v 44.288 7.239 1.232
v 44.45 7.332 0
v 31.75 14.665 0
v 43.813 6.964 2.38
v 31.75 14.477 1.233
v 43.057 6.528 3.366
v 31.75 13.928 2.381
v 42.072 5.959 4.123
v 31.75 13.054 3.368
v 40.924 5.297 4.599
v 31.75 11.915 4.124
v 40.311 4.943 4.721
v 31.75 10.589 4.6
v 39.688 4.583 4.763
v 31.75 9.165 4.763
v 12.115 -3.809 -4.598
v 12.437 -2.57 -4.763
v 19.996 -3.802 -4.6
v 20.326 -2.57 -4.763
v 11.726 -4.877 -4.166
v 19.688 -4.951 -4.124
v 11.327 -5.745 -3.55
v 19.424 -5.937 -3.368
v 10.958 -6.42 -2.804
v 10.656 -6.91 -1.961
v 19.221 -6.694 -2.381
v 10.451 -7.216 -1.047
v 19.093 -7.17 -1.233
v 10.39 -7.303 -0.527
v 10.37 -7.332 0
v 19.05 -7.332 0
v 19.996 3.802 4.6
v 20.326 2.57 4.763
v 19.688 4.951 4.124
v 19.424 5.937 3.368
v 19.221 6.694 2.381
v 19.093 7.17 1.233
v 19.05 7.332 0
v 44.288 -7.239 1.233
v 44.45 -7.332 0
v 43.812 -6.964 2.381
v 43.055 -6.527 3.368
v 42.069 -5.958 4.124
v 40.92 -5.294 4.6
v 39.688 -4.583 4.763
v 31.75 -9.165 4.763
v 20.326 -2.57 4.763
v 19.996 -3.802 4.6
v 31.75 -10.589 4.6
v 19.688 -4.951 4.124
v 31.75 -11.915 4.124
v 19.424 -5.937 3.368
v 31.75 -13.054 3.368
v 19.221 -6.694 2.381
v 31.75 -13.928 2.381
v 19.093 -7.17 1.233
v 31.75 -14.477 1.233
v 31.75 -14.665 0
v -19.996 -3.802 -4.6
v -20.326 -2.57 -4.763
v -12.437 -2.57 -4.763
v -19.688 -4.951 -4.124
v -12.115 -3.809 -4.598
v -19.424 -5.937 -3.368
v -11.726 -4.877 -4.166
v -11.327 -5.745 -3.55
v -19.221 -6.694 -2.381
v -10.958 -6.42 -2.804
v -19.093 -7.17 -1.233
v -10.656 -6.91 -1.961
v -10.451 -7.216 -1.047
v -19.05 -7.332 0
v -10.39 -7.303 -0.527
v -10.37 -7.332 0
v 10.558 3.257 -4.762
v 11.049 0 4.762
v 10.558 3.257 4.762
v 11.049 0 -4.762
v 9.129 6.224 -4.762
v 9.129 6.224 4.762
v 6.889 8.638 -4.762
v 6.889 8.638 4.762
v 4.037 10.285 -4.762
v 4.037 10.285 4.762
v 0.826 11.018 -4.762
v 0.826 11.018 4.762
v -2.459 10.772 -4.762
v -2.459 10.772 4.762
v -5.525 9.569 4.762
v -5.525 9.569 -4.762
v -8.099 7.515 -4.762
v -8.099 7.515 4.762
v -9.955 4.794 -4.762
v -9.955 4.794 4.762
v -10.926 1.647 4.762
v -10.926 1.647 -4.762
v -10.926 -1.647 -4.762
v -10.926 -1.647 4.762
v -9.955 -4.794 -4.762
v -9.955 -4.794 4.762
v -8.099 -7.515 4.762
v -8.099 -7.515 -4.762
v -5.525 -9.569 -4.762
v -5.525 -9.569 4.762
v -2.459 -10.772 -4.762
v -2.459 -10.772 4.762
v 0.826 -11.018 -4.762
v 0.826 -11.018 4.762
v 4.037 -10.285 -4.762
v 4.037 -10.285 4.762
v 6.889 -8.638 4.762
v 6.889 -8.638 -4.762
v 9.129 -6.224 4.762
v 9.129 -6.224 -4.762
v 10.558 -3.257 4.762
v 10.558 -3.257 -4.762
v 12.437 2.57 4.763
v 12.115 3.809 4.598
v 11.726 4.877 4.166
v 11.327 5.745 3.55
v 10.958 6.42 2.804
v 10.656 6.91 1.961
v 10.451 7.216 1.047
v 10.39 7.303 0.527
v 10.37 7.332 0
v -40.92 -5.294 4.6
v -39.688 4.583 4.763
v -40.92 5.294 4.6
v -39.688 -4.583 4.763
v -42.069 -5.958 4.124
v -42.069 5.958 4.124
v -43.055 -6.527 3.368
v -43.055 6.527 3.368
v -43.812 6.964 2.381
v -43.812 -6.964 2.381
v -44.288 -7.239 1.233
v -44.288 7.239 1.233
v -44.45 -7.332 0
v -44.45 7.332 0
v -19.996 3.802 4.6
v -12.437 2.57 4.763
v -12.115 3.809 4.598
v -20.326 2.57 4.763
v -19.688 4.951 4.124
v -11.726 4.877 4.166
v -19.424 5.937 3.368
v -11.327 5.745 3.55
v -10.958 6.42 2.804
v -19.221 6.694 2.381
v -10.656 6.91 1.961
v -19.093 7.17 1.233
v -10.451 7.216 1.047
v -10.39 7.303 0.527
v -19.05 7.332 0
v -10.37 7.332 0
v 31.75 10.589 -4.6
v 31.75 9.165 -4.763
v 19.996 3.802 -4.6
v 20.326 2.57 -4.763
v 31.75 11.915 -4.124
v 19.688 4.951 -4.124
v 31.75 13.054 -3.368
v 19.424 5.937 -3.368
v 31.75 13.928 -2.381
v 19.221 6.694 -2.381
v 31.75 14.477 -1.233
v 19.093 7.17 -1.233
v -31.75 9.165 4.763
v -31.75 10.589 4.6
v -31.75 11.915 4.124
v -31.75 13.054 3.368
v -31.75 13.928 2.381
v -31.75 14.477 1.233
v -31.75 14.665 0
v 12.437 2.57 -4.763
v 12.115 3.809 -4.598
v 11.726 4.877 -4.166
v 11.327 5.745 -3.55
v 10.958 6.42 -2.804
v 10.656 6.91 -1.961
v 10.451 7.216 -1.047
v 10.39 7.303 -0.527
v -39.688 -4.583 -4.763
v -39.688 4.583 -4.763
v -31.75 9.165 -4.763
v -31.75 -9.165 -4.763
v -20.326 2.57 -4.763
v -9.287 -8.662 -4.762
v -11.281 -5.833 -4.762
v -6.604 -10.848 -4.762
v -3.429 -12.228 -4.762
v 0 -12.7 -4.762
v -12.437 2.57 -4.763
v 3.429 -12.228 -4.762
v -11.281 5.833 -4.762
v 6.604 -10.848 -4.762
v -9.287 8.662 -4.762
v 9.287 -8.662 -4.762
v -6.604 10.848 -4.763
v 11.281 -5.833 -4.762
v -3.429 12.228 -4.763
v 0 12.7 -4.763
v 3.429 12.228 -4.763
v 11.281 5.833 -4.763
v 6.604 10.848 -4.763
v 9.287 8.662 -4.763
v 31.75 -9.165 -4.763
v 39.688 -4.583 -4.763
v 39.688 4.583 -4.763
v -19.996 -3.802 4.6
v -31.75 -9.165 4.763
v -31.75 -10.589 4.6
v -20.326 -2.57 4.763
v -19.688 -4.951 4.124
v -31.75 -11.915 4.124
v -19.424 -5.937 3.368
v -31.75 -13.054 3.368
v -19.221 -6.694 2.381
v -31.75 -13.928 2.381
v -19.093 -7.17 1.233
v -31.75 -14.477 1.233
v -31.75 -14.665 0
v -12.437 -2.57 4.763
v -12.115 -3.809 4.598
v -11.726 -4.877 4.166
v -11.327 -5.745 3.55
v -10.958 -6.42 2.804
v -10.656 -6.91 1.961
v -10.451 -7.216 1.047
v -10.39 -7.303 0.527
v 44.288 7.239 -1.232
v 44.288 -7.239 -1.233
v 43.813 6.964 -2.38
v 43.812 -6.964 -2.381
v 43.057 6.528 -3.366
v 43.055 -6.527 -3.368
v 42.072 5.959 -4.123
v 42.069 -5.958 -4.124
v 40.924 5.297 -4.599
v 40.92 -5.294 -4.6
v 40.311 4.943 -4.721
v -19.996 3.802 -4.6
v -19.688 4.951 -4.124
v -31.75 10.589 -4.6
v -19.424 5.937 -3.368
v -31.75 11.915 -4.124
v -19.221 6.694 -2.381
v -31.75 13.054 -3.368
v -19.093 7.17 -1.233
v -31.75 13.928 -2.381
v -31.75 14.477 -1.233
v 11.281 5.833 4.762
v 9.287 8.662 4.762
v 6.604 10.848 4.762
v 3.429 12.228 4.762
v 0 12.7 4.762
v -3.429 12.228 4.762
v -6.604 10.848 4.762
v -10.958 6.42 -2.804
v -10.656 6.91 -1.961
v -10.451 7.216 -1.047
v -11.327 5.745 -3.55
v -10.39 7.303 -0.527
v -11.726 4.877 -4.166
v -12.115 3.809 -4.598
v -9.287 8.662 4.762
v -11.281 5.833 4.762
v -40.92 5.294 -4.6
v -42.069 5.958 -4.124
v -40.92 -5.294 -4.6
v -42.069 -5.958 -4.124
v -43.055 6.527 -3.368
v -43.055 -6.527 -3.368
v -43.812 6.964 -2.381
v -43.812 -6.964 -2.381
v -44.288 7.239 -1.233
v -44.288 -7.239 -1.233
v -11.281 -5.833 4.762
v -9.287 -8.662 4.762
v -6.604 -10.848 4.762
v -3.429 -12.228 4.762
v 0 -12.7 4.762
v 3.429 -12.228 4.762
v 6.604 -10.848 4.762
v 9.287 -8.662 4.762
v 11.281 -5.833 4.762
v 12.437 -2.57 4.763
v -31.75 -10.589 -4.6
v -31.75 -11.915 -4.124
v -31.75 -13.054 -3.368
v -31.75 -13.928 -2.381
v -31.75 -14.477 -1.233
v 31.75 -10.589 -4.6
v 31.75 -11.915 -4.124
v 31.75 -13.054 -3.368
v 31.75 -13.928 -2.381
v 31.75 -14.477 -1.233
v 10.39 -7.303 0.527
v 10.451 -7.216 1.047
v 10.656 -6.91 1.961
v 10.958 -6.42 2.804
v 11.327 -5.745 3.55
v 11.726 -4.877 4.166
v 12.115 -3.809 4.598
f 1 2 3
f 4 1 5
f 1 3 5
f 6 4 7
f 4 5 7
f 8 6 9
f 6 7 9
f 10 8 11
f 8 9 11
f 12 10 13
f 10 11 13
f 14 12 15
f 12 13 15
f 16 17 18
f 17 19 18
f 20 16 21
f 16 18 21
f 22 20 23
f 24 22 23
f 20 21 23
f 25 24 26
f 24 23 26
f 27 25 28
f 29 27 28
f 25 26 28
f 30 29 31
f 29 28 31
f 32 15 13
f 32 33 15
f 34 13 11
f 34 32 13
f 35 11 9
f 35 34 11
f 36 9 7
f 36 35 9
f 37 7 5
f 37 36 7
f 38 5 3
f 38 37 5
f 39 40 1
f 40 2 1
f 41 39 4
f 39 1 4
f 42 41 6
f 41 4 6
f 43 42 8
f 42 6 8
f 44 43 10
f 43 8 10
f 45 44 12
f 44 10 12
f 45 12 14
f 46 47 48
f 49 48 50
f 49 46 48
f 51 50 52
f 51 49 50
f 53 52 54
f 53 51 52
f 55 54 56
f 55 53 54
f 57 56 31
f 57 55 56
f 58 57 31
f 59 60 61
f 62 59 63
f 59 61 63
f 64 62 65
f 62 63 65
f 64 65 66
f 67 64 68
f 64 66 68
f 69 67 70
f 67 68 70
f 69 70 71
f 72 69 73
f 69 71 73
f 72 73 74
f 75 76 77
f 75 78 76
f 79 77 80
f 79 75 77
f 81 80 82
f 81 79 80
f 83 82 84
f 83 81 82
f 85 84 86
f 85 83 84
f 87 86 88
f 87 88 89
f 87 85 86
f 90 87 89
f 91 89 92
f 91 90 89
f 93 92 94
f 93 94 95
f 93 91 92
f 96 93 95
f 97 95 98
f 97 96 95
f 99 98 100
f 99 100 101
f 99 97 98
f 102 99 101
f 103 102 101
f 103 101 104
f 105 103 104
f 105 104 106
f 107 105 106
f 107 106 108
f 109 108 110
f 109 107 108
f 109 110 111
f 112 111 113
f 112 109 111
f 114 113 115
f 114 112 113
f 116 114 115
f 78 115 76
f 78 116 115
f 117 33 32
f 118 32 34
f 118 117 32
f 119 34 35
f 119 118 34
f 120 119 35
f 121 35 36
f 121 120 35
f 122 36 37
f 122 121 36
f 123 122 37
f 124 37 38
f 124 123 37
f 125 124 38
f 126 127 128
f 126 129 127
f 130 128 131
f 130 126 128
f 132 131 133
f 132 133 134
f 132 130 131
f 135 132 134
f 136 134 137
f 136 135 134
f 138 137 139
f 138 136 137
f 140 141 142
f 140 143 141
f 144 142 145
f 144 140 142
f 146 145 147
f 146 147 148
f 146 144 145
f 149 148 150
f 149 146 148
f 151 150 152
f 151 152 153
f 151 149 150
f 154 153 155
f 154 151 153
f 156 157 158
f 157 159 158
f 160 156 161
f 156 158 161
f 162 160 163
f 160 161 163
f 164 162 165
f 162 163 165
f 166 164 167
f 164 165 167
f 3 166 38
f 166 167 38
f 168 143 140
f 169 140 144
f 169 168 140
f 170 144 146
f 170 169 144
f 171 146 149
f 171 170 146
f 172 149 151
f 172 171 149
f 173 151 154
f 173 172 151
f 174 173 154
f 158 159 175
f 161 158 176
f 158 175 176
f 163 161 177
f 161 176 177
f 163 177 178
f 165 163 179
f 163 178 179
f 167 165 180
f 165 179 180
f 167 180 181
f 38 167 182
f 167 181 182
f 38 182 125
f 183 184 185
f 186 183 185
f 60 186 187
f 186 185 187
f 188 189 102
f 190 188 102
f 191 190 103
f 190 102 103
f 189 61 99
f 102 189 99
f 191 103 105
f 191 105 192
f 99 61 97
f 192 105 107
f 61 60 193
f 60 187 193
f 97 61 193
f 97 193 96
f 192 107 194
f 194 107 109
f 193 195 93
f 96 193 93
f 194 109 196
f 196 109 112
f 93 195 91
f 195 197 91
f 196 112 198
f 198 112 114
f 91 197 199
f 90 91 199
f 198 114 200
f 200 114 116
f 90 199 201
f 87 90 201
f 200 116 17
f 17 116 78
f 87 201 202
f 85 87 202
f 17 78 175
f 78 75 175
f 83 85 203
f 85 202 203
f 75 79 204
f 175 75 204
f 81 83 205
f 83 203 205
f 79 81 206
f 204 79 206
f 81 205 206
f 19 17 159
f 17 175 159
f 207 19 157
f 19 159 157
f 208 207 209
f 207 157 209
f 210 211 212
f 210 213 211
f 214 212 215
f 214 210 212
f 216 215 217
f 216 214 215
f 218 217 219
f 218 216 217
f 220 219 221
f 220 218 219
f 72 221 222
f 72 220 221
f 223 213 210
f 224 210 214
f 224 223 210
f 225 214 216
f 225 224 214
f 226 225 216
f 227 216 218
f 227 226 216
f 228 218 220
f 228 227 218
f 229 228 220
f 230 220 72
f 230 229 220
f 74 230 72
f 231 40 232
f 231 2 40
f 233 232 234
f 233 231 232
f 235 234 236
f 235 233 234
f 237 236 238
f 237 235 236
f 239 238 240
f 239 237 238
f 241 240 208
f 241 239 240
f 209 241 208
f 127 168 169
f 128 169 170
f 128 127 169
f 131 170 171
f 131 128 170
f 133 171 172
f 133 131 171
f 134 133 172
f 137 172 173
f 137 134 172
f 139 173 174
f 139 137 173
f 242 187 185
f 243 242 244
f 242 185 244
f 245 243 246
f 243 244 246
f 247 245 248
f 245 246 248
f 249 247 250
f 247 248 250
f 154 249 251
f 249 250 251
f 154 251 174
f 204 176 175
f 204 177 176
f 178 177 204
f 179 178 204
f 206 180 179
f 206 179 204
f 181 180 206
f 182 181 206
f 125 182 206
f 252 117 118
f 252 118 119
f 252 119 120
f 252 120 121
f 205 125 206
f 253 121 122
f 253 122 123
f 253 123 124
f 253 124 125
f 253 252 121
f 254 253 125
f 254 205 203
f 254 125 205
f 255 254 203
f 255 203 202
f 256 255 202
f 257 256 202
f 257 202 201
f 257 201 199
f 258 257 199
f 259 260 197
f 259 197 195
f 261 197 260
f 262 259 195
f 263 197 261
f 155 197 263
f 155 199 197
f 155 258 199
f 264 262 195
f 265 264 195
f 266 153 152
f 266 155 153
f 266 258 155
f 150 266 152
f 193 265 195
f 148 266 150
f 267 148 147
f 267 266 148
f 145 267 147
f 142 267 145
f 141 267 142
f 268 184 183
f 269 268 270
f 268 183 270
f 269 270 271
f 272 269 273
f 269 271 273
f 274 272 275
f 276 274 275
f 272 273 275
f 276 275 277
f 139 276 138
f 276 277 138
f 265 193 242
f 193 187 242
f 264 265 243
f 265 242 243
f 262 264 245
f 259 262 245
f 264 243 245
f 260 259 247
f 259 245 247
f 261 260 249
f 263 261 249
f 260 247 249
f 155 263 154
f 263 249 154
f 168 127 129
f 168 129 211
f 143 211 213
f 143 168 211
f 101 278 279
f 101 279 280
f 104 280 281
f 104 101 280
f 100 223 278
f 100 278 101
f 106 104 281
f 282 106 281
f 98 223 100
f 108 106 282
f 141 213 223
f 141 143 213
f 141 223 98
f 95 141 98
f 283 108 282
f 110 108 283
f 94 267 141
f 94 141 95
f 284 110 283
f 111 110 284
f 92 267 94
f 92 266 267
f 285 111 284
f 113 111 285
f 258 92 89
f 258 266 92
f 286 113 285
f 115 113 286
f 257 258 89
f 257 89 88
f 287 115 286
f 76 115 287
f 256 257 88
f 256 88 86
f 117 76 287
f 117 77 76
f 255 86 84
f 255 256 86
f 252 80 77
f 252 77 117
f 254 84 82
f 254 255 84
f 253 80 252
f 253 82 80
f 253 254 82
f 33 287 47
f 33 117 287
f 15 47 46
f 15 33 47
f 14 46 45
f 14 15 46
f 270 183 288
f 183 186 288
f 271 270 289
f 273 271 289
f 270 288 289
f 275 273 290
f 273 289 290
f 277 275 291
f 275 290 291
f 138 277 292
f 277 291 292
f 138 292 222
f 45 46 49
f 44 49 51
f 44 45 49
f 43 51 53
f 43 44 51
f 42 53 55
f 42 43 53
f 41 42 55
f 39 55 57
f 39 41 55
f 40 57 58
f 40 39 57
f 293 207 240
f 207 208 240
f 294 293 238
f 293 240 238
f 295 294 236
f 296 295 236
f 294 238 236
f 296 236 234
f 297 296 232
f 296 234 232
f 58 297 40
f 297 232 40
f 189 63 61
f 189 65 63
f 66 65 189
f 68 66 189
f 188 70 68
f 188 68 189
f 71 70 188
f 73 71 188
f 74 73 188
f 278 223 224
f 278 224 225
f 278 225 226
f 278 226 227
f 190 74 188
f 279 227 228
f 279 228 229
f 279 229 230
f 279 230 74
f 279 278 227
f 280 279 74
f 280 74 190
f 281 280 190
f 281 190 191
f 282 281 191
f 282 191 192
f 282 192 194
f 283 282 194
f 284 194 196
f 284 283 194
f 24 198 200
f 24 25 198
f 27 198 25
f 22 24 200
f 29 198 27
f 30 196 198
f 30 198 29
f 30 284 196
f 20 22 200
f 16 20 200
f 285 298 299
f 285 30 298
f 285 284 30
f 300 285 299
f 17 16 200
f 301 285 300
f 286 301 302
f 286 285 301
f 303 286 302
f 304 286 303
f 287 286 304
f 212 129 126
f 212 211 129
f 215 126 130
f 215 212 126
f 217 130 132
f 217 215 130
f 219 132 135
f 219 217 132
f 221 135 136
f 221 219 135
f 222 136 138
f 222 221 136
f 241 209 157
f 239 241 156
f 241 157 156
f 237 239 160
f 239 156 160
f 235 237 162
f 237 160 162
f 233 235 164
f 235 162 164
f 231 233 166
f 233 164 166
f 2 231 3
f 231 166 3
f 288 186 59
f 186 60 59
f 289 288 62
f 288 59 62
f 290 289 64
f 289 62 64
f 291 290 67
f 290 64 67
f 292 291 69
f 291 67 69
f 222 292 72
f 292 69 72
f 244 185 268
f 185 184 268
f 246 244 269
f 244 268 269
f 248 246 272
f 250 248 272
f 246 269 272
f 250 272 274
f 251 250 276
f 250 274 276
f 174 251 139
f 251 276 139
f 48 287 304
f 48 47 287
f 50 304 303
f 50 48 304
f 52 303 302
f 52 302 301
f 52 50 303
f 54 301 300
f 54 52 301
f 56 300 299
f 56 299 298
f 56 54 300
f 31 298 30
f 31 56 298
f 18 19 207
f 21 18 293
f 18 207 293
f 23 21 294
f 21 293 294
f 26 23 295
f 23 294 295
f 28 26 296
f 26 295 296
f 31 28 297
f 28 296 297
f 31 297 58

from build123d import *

# Parameters (mm, degrees)
F0_R     = 12.7
F0_R_2   = 11.049
F1_DEPTH = 4.7625
F3_DEPTH = 4.7625
F4_R     = 4.76249
F5_R     = 4.76249


# Not quite as in the source:
# - a fillet or chamfer is up to 0.001 mm smaller than in the source, because OpenCascade refuses the exact size


with BuildPart() as f1:
    # F0 (on Top) → F1 (new body, symmetric)
    with BuildSketch(Plane.XY):
        Circle(F0_R)
        Circle(F0_R_2, mode=Mode.SUBTRACT)
    extrude(amount=F1_DEPTH, both=True)

    # F2 (on Top) → F3 (join, symmetric)
    with BuildSketch(Plane.XY):
        with BuildLine():
            ThreePointArc((-10.3695065778, -7.3323484187), (-12.7, 0), (-10.3695065778, 7.3323484187))
            Line((-10.3695065778, 7.3323484187), (-19.05, 7.3323484187))
            Line((-19.05, 7.3323484187), (-31.75, 14.6646968374))
            Line((-31.75, 14.6646968374), (-44.45, 7.3323484187))
            Line((-44.45, 7.3323484187), (-44.45, -7.3323484187))
            Line((-44.45, -7.3323484187), (-31.75, -14.6646968374))
            Line((-31.75, -14.6646968374), (-19.05, -7.3323484187))
            Line((-19.05, -7.3323484187), (-10.3695065778, -7.3323484187))
        make_face()
        with BuildLine():
            Line((44.45, -7.3323484187), (44.45, 7.3323484187))
            Line((44.45, 7.3323484187), (31.75, 14.6646968374))
            Line((31.75, 14.6646968374), (19.05, 7.3323484187))
            Line((19.05, 7.3323484187), (10.3695065778, 7.3323484187))
            ThreePointArc((10.3695065778, 7.3323484187), (12.7, 0), (10.3695065778, -7.3323484187))
            Line((10.3695065778, -7.3323484187), (19.05, -7.3323484187))
            Line((19.05, -7.3323484187), (31.75, -14.6646968374))
            Line((31.75, -14.6646968374), (44.45, -7.3323484187))
        make_face()
    extrude(amount=F3_DEPTH, both=True)

    # F4 (radius 4.7625 in the source; OpenCascade refuses exactly that, so slightly less here)
    f4_edges = [f1.edges().sort_by_distance(p)[0] for p in [
        (38.1, -10.998523, 4.7625),
        (44.45, 0, 4.7625),
        (25.4, -10.998523, 4.7625),
        (14.709753, -7.332348, 4.7625),
        (14.709753, 7.332348, 4.7625),
        (25.4, 10.998523, 4.7625),
        (38.1, 10.998523, 4.7625),
        (14.709753, -7.332348, -4.7625),
        (25.4, -10.998523, -4.7625),
        (38.1, -10.998523, -4.7625),
        (44.45, 0, -4.7625),
        (14.709753, 7.332348, -4.7625),
        (25.4, 10.998523, -4.7625),
        (38.1, 10.998523, -4.7625),
    ]]
    fillet(f4_edges, radius=F4_R)

    # F5 (radius 4.7625 in the source; OpenCascade refuses exactly that, so slightly less here)
    f5_edges = [f1.edges().sort_by_distance(p)[0] for p in [
        (-38.1, 10.998523, 4.7625),
        (-25.4, 10.998523, 4.7625),
        (-14.709753, 7.332348, 4.7625),
        (-14.709753, -7.332348, 4.7625),
        (-25.4, -10.998523, 4.7625),
        (-38.1, -10.998523, 4.7625),
        (-44.45, 0, -4.7625),
        (-44.45, 0, 4.7625),
        (-25.4, -10.998523, -4.7625),
        (-38.1, -10.998523, -4.7625),
        (-14.709753, -7.332348, -4.7625),
        (-14.709753, 7.332348, -4.7625),
        (-25.4, 10.998523, -4.7625),
        (-38.1, 10.998523, -4.7625),
    ]]
    fillet(f5_edges, radius=F5_R)


solid = f1.part
